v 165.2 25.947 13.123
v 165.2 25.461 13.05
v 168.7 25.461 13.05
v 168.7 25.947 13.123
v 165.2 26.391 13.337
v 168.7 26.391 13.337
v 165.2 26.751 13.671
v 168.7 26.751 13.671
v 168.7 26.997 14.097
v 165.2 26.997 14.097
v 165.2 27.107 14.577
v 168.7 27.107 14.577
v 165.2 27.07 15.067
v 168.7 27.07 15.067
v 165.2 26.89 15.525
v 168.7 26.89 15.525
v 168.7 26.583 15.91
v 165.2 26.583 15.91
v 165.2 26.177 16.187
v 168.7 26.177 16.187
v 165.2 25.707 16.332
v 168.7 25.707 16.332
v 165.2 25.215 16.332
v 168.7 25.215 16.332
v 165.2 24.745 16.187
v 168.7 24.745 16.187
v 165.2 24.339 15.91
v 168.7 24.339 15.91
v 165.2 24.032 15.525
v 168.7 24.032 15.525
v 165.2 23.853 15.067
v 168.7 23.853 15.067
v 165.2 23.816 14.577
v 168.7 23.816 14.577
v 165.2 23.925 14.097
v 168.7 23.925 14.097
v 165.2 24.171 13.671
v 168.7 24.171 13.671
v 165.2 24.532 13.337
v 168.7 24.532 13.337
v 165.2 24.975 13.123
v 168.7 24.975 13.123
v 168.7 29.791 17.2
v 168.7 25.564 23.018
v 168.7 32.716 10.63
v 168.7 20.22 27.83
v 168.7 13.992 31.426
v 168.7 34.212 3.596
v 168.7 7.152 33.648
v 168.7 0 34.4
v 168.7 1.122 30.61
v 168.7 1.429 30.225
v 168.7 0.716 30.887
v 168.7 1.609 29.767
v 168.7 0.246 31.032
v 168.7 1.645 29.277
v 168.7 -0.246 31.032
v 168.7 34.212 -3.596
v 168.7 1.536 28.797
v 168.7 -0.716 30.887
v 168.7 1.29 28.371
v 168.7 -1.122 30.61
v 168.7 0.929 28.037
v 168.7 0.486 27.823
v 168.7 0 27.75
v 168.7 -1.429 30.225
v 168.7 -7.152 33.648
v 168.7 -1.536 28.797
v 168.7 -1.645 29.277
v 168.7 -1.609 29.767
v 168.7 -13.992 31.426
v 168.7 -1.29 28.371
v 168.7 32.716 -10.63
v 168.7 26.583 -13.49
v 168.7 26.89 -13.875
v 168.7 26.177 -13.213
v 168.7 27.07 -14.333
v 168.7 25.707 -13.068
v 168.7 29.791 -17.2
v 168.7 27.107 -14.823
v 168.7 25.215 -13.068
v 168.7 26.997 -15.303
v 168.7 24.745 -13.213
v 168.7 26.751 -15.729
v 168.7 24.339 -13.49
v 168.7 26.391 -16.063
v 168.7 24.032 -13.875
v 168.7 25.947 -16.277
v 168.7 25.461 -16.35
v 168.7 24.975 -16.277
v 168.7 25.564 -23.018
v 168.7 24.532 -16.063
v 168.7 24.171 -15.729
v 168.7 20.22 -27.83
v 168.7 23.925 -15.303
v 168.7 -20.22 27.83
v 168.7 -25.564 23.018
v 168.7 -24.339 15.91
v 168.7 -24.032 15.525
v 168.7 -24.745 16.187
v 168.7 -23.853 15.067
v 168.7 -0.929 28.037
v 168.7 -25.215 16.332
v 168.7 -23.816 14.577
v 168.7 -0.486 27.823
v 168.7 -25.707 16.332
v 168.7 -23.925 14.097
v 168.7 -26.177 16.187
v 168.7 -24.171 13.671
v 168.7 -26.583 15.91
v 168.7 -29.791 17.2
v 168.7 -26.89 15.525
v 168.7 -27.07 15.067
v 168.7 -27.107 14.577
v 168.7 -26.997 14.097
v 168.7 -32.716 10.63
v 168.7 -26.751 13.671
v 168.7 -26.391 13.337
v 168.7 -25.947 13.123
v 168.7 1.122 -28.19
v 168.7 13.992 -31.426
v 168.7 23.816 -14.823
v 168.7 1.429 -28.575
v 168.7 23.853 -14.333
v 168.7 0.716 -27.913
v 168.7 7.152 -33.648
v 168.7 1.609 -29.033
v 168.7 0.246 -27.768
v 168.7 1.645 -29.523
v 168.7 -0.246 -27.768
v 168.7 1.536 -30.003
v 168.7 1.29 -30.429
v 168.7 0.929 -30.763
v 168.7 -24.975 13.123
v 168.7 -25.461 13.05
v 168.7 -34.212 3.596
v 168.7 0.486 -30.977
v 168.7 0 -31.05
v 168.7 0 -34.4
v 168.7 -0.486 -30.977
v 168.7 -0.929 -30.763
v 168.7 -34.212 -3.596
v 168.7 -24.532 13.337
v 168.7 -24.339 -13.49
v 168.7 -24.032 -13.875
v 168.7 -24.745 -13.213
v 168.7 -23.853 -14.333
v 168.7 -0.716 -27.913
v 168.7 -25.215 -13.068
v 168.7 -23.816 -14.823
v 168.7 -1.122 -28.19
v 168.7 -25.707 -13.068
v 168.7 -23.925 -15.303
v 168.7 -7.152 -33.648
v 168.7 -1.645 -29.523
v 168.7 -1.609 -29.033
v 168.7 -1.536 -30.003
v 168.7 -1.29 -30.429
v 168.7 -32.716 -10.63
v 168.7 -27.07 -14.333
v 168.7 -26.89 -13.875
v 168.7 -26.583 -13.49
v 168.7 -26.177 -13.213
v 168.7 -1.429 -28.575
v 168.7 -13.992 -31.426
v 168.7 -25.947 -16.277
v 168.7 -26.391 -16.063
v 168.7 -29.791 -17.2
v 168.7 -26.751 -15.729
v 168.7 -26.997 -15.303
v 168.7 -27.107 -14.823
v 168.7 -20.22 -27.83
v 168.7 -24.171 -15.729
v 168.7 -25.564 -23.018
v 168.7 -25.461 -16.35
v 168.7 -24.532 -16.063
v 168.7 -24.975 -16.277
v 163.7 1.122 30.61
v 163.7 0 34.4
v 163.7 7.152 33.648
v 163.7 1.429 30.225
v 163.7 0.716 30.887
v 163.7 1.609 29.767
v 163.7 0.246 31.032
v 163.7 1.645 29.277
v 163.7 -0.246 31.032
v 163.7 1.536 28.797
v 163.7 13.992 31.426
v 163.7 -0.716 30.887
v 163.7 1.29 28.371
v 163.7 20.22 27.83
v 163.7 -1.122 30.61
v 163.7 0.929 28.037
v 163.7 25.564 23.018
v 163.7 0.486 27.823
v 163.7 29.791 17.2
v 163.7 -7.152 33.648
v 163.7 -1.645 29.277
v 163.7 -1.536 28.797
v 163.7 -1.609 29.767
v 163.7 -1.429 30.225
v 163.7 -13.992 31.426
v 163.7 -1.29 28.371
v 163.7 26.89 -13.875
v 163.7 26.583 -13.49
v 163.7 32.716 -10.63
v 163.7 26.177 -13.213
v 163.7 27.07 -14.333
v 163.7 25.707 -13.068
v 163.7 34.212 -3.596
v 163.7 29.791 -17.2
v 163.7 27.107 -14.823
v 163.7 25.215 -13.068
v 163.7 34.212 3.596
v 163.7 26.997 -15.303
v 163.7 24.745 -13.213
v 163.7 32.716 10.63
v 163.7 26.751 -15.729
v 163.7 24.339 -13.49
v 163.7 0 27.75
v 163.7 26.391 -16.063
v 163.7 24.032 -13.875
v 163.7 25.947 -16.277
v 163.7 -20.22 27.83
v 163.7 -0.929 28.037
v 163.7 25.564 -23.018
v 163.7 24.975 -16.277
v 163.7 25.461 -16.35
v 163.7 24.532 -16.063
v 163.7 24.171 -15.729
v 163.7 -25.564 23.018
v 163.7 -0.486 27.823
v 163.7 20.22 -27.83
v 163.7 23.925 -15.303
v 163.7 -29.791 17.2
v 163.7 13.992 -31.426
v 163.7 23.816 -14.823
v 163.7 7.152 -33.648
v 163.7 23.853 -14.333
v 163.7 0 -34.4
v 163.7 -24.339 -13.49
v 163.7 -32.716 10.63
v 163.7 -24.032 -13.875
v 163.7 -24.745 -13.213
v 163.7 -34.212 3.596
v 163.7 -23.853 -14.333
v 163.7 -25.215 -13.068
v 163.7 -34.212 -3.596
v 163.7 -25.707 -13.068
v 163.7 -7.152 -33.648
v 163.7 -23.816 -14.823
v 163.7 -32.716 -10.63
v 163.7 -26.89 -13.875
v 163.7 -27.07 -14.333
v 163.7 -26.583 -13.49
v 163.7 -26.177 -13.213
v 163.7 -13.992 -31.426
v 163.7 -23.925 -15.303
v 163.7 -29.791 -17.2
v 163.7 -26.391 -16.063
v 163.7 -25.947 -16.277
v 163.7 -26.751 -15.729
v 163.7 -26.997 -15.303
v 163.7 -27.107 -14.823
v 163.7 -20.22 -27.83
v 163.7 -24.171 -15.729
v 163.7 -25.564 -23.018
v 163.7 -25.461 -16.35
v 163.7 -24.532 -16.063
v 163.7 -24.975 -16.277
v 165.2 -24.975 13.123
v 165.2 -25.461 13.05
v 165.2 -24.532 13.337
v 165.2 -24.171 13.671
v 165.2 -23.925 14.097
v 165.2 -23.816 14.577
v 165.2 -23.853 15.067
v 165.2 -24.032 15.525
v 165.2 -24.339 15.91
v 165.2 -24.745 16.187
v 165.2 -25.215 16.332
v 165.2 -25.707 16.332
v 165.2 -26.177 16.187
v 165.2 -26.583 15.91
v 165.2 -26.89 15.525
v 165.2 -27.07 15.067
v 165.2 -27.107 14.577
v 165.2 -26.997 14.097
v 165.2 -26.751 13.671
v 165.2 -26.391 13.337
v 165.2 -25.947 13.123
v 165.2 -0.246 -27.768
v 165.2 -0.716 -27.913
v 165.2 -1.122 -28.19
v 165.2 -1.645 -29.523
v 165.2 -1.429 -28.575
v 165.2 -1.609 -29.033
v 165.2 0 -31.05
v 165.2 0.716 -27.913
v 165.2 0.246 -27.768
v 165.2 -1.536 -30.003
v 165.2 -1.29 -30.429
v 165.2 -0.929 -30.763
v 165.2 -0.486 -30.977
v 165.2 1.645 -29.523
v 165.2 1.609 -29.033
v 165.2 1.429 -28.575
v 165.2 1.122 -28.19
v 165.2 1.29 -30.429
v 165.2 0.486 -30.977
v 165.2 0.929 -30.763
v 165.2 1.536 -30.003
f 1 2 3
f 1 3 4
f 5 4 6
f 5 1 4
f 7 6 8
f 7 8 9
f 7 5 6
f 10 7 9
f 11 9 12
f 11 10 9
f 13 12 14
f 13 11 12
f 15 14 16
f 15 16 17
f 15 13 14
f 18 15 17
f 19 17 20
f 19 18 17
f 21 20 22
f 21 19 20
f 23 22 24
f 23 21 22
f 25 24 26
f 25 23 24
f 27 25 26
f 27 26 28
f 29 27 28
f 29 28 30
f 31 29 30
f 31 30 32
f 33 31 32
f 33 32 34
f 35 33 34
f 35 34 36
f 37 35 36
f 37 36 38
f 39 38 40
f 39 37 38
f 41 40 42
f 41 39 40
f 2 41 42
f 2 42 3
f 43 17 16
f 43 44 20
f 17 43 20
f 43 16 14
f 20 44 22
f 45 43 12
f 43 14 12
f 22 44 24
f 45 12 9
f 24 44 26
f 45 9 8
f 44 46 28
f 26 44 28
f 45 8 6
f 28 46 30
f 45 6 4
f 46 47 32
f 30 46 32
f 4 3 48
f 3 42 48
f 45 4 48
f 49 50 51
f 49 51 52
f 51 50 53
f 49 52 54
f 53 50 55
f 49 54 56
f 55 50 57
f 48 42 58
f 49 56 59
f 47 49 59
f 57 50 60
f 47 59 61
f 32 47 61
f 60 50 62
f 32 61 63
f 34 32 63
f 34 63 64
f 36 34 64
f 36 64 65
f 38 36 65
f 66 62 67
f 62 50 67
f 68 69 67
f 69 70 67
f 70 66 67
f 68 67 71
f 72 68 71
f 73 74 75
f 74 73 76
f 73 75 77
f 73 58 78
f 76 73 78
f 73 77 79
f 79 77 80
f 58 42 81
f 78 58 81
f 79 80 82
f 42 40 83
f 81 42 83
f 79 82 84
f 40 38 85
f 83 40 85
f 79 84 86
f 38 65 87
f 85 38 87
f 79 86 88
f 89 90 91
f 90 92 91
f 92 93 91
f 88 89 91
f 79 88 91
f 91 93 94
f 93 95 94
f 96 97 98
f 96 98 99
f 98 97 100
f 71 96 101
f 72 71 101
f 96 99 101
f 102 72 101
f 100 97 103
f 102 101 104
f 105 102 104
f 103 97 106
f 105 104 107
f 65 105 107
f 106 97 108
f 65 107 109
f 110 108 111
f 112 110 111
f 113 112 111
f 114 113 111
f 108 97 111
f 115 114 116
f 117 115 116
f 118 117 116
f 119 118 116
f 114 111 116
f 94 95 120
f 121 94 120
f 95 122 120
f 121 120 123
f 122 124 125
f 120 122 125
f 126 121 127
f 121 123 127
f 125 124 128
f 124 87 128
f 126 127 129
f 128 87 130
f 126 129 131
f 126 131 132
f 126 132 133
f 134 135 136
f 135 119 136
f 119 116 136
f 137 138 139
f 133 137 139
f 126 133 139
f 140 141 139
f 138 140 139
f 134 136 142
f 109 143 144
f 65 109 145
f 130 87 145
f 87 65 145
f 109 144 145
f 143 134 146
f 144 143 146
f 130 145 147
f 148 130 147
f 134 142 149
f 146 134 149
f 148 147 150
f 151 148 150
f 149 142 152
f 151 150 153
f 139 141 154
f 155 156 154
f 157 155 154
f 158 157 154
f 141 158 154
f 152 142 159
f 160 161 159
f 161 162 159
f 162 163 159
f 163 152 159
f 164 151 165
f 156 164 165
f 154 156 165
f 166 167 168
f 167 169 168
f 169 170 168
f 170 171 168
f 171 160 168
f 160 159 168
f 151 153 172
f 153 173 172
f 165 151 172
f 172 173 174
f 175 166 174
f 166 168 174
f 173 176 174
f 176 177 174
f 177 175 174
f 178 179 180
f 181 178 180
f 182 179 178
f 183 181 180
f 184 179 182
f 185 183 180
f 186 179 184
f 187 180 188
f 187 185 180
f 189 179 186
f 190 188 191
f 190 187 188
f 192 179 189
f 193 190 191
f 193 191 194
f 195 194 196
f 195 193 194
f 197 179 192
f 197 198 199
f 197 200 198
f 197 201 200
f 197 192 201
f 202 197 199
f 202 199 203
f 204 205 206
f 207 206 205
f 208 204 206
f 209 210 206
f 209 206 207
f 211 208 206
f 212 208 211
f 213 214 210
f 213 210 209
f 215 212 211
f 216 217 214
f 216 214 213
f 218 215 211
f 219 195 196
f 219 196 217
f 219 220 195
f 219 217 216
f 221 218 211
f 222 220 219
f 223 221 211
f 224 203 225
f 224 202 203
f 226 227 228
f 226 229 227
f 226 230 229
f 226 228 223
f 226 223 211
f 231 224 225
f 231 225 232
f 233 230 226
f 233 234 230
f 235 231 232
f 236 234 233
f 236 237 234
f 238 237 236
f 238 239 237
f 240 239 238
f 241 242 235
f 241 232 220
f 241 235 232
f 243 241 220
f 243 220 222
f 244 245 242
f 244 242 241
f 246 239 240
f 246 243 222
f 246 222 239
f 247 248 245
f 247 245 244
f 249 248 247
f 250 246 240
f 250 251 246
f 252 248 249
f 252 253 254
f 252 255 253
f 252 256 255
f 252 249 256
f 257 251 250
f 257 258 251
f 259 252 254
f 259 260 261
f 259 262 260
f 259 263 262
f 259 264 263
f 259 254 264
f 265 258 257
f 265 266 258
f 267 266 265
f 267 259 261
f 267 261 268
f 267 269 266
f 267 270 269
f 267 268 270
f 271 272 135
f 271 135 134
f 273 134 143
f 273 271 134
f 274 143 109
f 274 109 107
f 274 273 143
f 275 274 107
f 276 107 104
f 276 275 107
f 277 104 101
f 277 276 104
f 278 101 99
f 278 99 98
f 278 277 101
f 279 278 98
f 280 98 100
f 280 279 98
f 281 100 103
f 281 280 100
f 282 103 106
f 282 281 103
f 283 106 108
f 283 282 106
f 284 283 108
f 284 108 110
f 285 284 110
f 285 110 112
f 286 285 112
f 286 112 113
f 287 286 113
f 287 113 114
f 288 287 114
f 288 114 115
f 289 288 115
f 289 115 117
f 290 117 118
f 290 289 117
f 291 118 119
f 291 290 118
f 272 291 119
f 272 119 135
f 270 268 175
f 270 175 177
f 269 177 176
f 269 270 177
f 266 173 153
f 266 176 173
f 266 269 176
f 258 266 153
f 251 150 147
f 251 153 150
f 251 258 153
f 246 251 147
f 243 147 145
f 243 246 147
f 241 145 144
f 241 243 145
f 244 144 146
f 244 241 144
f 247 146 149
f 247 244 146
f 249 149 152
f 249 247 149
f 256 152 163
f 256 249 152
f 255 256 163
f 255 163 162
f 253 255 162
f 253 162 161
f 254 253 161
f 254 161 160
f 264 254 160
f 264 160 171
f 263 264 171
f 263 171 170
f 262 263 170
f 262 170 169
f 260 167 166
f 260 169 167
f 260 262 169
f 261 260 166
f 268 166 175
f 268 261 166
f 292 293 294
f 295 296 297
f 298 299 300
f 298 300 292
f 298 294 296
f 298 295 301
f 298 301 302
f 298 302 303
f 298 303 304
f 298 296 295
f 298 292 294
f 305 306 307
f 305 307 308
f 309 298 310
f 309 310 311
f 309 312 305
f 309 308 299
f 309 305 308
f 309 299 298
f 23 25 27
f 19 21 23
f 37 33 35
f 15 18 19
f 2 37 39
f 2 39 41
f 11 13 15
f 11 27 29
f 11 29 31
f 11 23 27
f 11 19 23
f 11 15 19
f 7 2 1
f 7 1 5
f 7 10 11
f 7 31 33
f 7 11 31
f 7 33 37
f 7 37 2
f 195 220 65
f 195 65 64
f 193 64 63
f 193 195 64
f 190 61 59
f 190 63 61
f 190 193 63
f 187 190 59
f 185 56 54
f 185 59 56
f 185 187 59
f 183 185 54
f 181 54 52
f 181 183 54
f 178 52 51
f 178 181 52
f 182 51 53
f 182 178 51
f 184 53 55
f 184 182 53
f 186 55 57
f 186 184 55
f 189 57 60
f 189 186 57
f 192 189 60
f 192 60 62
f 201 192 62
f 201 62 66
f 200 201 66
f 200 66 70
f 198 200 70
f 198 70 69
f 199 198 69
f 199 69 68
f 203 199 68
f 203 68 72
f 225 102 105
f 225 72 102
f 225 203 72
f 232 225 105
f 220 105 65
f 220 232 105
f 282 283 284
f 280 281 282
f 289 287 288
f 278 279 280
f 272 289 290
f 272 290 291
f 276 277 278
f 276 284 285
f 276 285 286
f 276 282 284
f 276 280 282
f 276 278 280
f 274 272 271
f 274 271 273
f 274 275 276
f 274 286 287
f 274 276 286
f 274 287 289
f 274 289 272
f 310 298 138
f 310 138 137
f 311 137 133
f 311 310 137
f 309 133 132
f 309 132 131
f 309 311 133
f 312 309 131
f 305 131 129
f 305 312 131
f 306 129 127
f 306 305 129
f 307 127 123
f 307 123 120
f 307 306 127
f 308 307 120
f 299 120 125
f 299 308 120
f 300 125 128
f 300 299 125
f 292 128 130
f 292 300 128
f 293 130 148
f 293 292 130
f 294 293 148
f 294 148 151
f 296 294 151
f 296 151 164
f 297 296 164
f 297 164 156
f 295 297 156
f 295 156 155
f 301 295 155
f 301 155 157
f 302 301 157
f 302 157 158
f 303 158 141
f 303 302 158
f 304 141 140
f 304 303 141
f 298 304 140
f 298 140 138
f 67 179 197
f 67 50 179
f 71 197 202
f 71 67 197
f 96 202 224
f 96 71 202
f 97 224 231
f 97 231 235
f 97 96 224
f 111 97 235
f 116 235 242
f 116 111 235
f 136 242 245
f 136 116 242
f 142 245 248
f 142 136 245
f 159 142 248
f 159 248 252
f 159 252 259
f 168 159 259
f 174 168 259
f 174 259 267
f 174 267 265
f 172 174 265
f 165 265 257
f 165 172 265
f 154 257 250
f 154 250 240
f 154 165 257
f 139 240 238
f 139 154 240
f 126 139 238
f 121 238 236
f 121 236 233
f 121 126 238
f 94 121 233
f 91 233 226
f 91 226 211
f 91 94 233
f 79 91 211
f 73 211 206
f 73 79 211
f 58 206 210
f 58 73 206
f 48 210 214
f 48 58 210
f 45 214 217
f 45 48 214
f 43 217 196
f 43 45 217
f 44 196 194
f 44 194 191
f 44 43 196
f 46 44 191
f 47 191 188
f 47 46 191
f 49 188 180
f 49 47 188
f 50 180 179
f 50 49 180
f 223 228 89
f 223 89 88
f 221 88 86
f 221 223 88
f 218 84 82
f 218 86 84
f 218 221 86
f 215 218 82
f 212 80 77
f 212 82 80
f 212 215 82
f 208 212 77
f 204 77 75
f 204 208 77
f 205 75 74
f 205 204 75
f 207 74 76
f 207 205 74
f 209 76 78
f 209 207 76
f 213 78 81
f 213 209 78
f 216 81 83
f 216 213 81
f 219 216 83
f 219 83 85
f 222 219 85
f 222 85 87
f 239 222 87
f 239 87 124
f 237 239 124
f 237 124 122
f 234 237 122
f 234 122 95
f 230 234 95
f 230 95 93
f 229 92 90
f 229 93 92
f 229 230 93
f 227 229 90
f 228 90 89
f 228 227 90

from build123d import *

# Parameters (mm, degrees)
AXIAL_PROFILE_MM_W     = 5
AXIAL_PROFILE_MM_H     = 34.4
AXIAL_HOLES_DEPTH      = 176.574514096
AXIAL_HOLES_DEPTH_BACK = 176.574514096
SKETCH2_R              = 1.65
CUT_EXTRUDE2_START     = 165.2
SKETCH3_R              = 1.65
CUT_EXTRUDE2_DEPTH     = 3.5


with BuildPart() as part:
    # Axial profile (mm) → Full revolution (revolve)
    with BuildSketch(Plane.XY, mode=Mode.PRIVATE) as full_revolution_sk:
        with Locations((166.2, 17.2)):
            Rectangle(AXIAL_PROFILE_MM_W, AXIAL_PROFILE_MM_H)
    revolve(full_revolution_sk.sketch.rotate(Axis((-110, 0, 0), (1, 0, 0)), 90), axis=Axis((-110, 0, 0), (1, 0, 0)))

    # Sketch2 → Axial holes (cut, two sides: drawn at the far end of the back side and taken through both)
    with BuildSketch(Plane(origin=(0, 0, 0), x_dir=(0, 0, -1), z_dir=(1, 0, 0)).offset(-AXIAL_HOLES_DEPTH_BACK)):
        with Locations((-29.4, 0)):
            Circle(SKETCH2_R)
        with Locations((14.7, -25.461146871)):
            Circle(SKETCH2_R)
        with Locations((14.7, 25.461146871)):
            Circle(SKETCH2_R)
    extrude(amount=AXIAL_HOLES_DEPTH + AXIAL_HOLES_DEPTH_BACK, mode=Mode.SUBTRACT)

    # Sketch3 → Cut-Extrude2 (cut)
    with BuildSketch(Plane(origin=(0, 0, 0), x_dir=(0, 0, -1), z_dir=(1, 0, 0)).offset(CUT_EXTRUDE2_START)):
        with Locations((29.4, 0)):
            Circle(SKETCH3_R)
        with Locations((-14.7, 25.461146871)):
            Circle(SKETCH3_R)
        with Locations((-14.7, -25.461146871)):
            Circle(SKETCH3_R)
    extrude(amount=CUT_EXTRUDE2_DEPTH, mode=Mode.SUBTRACT)


solid = part.part
